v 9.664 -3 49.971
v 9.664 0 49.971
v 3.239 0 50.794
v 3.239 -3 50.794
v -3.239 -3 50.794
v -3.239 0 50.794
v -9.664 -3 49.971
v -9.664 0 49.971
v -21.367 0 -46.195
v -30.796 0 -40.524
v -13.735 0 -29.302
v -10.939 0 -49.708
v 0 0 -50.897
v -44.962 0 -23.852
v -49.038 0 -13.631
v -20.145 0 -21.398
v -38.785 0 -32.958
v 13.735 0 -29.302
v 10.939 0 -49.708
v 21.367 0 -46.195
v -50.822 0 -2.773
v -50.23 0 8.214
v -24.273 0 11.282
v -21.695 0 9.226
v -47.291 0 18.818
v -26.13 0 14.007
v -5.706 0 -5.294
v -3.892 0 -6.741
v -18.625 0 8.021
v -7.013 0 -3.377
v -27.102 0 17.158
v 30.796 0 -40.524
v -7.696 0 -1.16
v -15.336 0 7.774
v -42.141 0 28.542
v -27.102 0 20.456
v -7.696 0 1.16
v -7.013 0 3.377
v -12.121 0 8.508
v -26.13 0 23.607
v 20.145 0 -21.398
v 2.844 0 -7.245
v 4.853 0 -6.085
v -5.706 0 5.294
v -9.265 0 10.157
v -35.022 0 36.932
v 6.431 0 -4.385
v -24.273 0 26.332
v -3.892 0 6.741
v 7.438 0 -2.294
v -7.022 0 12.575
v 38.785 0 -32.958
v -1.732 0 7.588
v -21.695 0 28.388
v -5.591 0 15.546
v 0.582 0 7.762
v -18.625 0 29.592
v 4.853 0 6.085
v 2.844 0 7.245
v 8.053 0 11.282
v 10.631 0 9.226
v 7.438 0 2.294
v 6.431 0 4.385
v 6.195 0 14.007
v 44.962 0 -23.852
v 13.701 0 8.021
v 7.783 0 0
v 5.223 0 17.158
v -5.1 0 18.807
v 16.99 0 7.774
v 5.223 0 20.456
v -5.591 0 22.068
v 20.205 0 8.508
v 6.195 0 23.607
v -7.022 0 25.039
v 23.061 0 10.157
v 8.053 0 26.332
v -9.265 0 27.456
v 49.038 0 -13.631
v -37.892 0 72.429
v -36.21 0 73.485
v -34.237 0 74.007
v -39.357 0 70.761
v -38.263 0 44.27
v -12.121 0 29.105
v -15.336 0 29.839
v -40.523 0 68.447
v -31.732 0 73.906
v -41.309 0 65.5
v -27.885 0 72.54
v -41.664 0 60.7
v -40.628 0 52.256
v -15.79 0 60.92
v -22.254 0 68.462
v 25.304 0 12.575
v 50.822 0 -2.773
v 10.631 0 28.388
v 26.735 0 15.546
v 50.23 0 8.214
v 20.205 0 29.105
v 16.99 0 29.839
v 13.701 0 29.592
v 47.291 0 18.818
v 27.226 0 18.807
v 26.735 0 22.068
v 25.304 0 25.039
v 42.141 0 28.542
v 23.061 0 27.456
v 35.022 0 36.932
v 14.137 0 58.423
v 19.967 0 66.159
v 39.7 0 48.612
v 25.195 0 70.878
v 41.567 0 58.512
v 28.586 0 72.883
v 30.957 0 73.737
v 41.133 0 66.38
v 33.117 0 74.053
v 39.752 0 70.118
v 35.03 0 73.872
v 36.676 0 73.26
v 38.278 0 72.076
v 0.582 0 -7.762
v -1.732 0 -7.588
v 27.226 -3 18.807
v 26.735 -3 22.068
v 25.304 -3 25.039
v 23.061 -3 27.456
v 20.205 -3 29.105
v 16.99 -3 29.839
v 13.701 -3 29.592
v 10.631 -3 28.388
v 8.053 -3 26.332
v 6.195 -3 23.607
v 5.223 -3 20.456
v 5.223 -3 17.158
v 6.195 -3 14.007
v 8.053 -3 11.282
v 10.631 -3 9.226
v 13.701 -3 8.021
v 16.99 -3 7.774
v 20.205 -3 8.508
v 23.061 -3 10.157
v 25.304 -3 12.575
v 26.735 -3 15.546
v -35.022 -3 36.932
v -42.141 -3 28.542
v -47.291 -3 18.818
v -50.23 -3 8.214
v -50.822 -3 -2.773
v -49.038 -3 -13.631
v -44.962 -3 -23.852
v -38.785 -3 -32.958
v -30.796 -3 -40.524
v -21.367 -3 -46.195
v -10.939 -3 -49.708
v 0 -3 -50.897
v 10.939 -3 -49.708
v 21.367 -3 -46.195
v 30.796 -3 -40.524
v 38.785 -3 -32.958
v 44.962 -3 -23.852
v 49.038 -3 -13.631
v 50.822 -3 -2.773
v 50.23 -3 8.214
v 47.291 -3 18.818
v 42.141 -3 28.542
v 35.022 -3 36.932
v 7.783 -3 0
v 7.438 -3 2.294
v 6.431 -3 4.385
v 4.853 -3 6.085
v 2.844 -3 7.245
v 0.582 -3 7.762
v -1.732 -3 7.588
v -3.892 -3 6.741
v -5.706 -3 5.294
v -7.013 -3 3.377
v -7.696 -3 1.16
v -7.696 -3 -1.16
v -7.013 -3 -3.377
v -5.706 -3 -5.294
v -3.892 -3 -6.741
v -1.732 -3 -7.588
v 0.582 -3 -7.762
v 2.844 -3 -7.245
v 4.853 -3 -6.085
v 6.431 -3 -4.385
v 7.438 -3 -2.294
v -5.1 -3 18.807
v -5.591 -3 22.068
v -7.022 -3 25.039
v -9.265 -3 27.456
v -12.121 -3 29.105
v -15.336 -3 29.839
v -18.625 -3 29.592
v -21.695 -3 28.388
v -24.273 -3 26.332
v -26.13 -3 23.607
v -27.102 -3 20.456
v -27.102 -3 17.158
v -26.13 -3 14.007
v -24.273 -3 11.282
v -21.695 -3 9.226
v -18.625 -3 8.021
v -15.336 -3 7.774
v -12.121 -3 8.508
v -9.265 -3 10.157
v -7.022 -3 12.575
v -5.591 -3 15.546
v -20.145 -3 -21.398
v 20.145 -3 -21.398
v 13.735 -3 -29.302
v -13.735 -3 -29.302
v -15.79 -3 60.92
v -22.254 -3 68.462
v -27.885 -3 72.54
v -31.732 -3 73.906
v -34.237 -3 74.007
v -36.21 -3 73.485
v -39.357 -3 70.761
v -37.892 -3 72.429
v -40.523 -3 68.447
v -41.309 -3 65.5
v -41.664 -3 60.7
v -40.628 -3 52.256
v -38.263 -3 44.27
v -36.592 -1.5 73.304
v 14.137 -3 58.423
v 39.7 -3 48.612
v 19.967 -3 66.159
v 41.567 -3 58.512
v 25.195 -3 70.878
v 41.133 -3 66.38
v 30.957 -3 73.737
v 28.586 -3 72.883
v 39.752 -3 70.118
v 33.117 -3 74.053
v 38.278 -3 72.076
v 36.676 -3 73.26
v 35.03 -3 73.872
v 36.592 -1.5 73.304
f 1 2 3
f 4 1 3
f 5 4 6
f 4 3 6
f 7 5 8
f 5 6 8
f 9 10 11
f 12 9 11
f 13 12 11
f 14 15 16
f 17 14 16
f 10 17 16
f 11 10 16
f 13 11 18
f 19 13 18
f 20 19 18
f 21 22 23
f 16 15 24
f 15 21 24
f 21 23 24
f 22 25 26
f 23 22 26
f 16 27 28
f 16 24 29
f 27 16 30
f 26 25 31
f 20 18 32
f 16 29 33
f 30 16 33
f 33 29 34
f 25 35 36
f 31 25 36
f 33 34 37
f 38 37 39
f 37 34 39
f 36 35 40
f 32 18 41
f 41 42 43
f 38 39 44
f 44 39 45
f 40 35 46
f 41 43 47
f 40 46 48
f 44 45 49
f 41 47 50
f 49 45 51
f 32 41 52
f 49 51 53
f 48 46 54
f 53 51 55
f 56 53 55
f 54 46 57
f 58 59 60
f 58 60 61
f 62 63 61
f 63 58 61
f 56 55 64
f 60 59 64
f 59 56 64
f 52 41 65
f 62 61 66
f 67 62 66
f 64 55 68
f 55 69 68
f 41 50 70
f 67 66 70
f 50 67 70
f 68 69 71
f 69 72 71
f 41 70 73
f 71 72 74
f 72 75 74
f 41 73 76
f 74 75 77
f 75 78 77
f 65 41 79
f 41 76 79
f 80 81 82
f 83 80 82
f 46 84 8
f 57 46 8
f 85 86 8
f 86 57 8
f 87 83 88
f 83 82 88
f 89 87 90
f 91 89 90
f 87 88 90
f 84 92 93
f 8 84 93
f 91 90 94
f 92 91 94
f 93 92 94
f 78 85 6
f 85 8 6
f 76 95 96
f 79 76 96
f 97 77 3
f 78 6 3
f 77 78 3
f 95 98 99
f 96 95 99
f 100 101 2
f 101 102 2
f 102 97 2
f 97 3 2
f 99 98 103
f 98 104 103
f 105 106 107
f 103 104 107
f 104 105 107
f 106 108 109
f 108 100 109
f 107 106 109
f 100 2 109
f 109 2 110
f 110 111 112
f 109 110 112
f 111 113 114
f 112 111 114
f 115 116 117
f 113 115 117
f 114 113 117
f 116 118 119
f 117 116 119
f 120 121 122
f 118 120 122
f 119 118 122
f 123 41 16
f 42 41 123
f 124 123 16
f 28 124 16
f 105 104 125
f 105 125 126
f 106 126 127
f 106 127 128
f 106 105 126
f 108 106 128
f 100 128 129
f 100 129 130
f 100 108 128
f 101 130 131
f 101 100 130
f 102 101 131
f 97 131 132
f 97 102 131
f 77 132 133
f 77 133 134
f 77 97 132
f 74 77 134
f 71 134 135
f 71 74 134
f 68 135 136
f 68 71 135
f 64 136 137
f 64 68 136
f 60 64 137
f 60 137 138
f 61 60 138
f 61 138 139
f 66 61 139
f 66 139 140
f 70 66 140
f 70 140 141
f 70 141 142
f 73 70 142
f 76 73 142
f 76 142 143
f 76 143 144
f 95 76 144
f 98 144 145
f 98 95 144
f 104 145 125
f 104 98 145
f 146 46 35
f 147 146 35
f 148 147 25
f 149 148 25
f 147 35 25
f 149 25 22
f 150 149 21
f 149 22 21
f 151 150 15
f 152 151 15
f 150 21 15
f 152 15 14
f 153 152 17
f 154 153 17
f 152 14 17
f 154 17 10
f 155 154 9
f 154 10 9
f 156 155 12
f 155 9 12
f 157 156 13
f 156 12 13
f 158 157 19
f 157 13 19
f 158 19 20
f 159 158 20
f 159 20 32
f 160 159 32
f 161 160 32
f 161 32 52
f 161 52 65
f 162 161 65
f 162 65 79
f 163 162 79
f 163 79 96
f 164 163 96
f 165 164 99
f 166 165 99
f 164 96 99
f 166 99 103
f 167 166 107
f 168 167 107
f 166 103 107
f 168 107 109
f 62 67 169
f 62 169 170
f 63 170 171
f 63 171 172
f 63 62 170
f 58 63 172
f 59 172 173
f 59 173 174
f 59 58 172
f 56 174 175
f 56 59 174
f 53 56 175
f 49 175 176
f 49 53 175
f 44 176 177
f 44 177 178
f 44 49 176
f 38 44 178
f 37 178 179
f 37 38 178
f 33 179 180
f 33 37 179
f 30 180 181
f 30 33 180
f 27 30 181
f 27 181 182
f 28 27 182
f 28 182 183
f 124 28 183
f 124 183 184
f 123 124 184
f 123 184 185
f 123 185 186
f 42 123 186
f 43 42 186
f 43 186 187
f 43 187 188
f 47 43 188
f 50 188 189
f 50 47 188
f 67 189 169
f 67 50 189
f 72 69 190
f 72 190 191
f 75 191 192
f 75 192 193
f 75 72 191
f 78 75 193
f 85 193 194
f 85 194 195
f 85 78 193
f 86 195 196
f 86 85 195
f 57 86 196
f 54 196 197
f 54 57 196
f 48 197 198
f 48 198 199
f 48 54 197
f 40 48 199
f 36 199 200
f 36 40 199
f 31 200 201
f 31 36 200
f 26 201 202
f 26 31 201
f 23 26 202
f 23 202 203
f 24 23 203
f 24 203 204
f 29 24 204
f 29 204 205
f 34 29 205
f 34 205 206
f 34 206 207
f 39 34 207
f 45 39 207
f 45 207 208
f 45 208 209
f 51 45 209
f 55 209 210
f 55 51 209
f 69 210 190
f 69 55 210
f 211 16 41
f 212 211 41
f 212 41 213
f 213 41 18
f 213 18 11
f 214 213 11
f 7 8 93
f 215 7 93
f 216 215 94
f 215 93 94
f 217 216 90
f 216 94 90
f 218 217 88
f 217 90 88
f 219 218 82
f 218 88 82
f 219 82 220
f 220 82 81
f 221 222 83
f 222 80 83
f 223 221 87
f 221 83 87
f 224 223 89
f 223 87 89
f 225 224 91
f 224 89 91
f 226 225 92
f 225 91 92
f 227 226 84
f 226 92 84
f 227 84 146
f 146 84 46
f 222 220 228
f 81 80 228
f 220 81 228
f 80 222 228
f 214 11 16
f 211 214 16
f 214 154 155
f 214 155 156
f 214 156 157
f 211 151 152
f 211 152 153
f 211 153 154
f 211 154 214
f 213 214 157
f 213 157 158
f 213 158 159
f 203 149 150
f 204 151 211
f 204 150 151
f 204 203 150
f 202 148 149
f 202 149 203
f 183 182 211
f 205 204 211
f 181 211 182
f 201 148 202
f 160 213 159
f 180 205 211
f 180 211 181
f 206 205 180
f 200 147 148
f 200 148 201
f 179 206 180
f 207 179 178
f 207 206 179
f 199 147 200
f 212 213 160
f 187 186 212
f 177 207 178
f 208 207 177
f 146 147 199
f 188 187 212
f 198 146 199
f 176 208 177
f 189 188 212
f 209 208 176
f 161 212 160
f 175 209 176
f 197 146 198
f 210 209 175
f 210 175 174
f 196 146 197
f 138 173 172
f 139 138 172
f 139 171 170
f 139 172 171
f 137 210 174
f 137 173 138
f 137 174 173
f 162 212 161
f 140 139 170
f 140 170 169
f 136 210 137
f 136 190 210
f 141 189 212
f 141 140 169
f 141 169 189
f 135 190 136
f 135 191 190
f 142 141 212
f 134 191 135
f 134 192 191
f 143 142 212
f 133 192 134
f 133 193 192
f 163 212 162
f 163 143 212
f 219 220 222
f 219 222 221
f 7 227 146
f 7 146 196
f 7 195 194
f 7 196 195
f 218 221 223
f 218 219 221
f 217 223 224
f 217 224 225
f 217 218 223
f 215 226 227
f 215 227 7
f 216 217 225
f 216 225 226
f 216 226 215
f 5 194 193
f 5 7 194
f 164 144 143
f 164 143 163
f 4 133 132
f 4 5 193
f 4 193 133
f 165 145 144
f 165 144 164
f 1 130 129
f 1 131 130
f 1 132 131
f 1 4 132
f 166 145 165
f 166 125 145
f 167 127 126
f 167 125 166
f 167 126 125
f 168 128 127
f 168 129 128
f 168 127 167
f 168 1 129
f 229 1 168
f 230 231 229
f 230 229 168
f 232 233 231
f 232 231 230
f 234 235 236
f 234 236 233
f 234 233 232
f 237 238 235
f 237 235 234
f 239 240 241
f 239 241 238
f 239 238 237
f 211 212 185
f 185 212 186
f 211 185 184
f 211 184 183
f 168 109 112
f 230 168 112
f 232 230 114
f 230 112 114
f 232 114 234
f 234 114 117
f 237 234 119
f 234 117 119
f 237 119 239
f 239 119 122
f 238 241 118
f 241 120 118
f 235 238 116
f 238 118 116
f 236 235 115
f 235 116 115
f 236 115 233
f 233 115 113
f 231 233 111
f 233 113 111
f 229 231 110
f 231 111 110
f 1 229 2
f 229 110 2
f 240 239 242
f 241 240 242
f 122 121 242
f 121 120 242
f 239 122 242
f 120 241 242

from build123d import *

# Parameters (mm, degrees)
F0_R     = 7.7834301628
F0_R_2   = 11.0631292908
F1_DEPTH = 3


with BuildPart() as f1:
    # F0 (on Front) → F1 (new body)
    with BuildSketch(Plane.XZ):
        with BuildLine():
            add(Edge.make_bspline(
                [(35.022471909, 36.9317159104), (50.1623293635, 66.3260911324), (36.5921272811, 73.3041068925), (23.0219251988, 80.2821226526), (9.6644197358, 49.9712334236)],
                knots=[1.4877804078, 1.4877804078, 1.4877804078, 3.1242955652, 3.1242955652, 4.7608107226, 4.7608107226, 4.7608107226], degree=2, weights=[1, 0.6834941351, 1, 0.6834941351, 1]))
            ThreePointArc((9.6644197358, 49.9712334236), (0, 50.8972020715), (-9.6644197358, 49.9712334236))
            add(Edge.make_bspline(
                [(-9.6644197358, 49.9712334236), (-23.0219251988, 80.2821226526), (-36.5921272811, 73.3041068925), (-50.1623293635, 66.3260911324), (-35.022471909, 36.9317159104)],
                knots=[1.5223745846, 1.5223745846, 1.5223745846, 3.158889742, 3.158889742, 4.7954048994, 4.7954048994, 4.7954048994], degree=2, weights=[1, 0.6834941351, 1, 0.6834941351, 1]))
            ThreePointArc((-35.022471909, 36.9317159104), (0, -50.8972020715), (35.022471909, 36.9317159104))
        make_face()
        Polygon((-20.1453492045, -21.3980246335), (0, -21.3980246335), (20.1453492045, -21.3980246335), (13.7354657054, -29.3023269624), (-13.7354657054, -29.3023269624), align=None, mode=Mode.SUBTRACT)
        Circle(F0_R, mode=Mode.SUBTRACT)
        with Locations((-16.1629359797, 18.8066806758)):
            Circle(F0_R_2, mode=Mode.SUBTRACT)
        with Locations((16.1629359797, 18.8066806758)):
            Circle(F0_R_2, mode=Mode.SUBTRACT)
    extrude(amount=F1_DEPTH)


solid = f1.part
